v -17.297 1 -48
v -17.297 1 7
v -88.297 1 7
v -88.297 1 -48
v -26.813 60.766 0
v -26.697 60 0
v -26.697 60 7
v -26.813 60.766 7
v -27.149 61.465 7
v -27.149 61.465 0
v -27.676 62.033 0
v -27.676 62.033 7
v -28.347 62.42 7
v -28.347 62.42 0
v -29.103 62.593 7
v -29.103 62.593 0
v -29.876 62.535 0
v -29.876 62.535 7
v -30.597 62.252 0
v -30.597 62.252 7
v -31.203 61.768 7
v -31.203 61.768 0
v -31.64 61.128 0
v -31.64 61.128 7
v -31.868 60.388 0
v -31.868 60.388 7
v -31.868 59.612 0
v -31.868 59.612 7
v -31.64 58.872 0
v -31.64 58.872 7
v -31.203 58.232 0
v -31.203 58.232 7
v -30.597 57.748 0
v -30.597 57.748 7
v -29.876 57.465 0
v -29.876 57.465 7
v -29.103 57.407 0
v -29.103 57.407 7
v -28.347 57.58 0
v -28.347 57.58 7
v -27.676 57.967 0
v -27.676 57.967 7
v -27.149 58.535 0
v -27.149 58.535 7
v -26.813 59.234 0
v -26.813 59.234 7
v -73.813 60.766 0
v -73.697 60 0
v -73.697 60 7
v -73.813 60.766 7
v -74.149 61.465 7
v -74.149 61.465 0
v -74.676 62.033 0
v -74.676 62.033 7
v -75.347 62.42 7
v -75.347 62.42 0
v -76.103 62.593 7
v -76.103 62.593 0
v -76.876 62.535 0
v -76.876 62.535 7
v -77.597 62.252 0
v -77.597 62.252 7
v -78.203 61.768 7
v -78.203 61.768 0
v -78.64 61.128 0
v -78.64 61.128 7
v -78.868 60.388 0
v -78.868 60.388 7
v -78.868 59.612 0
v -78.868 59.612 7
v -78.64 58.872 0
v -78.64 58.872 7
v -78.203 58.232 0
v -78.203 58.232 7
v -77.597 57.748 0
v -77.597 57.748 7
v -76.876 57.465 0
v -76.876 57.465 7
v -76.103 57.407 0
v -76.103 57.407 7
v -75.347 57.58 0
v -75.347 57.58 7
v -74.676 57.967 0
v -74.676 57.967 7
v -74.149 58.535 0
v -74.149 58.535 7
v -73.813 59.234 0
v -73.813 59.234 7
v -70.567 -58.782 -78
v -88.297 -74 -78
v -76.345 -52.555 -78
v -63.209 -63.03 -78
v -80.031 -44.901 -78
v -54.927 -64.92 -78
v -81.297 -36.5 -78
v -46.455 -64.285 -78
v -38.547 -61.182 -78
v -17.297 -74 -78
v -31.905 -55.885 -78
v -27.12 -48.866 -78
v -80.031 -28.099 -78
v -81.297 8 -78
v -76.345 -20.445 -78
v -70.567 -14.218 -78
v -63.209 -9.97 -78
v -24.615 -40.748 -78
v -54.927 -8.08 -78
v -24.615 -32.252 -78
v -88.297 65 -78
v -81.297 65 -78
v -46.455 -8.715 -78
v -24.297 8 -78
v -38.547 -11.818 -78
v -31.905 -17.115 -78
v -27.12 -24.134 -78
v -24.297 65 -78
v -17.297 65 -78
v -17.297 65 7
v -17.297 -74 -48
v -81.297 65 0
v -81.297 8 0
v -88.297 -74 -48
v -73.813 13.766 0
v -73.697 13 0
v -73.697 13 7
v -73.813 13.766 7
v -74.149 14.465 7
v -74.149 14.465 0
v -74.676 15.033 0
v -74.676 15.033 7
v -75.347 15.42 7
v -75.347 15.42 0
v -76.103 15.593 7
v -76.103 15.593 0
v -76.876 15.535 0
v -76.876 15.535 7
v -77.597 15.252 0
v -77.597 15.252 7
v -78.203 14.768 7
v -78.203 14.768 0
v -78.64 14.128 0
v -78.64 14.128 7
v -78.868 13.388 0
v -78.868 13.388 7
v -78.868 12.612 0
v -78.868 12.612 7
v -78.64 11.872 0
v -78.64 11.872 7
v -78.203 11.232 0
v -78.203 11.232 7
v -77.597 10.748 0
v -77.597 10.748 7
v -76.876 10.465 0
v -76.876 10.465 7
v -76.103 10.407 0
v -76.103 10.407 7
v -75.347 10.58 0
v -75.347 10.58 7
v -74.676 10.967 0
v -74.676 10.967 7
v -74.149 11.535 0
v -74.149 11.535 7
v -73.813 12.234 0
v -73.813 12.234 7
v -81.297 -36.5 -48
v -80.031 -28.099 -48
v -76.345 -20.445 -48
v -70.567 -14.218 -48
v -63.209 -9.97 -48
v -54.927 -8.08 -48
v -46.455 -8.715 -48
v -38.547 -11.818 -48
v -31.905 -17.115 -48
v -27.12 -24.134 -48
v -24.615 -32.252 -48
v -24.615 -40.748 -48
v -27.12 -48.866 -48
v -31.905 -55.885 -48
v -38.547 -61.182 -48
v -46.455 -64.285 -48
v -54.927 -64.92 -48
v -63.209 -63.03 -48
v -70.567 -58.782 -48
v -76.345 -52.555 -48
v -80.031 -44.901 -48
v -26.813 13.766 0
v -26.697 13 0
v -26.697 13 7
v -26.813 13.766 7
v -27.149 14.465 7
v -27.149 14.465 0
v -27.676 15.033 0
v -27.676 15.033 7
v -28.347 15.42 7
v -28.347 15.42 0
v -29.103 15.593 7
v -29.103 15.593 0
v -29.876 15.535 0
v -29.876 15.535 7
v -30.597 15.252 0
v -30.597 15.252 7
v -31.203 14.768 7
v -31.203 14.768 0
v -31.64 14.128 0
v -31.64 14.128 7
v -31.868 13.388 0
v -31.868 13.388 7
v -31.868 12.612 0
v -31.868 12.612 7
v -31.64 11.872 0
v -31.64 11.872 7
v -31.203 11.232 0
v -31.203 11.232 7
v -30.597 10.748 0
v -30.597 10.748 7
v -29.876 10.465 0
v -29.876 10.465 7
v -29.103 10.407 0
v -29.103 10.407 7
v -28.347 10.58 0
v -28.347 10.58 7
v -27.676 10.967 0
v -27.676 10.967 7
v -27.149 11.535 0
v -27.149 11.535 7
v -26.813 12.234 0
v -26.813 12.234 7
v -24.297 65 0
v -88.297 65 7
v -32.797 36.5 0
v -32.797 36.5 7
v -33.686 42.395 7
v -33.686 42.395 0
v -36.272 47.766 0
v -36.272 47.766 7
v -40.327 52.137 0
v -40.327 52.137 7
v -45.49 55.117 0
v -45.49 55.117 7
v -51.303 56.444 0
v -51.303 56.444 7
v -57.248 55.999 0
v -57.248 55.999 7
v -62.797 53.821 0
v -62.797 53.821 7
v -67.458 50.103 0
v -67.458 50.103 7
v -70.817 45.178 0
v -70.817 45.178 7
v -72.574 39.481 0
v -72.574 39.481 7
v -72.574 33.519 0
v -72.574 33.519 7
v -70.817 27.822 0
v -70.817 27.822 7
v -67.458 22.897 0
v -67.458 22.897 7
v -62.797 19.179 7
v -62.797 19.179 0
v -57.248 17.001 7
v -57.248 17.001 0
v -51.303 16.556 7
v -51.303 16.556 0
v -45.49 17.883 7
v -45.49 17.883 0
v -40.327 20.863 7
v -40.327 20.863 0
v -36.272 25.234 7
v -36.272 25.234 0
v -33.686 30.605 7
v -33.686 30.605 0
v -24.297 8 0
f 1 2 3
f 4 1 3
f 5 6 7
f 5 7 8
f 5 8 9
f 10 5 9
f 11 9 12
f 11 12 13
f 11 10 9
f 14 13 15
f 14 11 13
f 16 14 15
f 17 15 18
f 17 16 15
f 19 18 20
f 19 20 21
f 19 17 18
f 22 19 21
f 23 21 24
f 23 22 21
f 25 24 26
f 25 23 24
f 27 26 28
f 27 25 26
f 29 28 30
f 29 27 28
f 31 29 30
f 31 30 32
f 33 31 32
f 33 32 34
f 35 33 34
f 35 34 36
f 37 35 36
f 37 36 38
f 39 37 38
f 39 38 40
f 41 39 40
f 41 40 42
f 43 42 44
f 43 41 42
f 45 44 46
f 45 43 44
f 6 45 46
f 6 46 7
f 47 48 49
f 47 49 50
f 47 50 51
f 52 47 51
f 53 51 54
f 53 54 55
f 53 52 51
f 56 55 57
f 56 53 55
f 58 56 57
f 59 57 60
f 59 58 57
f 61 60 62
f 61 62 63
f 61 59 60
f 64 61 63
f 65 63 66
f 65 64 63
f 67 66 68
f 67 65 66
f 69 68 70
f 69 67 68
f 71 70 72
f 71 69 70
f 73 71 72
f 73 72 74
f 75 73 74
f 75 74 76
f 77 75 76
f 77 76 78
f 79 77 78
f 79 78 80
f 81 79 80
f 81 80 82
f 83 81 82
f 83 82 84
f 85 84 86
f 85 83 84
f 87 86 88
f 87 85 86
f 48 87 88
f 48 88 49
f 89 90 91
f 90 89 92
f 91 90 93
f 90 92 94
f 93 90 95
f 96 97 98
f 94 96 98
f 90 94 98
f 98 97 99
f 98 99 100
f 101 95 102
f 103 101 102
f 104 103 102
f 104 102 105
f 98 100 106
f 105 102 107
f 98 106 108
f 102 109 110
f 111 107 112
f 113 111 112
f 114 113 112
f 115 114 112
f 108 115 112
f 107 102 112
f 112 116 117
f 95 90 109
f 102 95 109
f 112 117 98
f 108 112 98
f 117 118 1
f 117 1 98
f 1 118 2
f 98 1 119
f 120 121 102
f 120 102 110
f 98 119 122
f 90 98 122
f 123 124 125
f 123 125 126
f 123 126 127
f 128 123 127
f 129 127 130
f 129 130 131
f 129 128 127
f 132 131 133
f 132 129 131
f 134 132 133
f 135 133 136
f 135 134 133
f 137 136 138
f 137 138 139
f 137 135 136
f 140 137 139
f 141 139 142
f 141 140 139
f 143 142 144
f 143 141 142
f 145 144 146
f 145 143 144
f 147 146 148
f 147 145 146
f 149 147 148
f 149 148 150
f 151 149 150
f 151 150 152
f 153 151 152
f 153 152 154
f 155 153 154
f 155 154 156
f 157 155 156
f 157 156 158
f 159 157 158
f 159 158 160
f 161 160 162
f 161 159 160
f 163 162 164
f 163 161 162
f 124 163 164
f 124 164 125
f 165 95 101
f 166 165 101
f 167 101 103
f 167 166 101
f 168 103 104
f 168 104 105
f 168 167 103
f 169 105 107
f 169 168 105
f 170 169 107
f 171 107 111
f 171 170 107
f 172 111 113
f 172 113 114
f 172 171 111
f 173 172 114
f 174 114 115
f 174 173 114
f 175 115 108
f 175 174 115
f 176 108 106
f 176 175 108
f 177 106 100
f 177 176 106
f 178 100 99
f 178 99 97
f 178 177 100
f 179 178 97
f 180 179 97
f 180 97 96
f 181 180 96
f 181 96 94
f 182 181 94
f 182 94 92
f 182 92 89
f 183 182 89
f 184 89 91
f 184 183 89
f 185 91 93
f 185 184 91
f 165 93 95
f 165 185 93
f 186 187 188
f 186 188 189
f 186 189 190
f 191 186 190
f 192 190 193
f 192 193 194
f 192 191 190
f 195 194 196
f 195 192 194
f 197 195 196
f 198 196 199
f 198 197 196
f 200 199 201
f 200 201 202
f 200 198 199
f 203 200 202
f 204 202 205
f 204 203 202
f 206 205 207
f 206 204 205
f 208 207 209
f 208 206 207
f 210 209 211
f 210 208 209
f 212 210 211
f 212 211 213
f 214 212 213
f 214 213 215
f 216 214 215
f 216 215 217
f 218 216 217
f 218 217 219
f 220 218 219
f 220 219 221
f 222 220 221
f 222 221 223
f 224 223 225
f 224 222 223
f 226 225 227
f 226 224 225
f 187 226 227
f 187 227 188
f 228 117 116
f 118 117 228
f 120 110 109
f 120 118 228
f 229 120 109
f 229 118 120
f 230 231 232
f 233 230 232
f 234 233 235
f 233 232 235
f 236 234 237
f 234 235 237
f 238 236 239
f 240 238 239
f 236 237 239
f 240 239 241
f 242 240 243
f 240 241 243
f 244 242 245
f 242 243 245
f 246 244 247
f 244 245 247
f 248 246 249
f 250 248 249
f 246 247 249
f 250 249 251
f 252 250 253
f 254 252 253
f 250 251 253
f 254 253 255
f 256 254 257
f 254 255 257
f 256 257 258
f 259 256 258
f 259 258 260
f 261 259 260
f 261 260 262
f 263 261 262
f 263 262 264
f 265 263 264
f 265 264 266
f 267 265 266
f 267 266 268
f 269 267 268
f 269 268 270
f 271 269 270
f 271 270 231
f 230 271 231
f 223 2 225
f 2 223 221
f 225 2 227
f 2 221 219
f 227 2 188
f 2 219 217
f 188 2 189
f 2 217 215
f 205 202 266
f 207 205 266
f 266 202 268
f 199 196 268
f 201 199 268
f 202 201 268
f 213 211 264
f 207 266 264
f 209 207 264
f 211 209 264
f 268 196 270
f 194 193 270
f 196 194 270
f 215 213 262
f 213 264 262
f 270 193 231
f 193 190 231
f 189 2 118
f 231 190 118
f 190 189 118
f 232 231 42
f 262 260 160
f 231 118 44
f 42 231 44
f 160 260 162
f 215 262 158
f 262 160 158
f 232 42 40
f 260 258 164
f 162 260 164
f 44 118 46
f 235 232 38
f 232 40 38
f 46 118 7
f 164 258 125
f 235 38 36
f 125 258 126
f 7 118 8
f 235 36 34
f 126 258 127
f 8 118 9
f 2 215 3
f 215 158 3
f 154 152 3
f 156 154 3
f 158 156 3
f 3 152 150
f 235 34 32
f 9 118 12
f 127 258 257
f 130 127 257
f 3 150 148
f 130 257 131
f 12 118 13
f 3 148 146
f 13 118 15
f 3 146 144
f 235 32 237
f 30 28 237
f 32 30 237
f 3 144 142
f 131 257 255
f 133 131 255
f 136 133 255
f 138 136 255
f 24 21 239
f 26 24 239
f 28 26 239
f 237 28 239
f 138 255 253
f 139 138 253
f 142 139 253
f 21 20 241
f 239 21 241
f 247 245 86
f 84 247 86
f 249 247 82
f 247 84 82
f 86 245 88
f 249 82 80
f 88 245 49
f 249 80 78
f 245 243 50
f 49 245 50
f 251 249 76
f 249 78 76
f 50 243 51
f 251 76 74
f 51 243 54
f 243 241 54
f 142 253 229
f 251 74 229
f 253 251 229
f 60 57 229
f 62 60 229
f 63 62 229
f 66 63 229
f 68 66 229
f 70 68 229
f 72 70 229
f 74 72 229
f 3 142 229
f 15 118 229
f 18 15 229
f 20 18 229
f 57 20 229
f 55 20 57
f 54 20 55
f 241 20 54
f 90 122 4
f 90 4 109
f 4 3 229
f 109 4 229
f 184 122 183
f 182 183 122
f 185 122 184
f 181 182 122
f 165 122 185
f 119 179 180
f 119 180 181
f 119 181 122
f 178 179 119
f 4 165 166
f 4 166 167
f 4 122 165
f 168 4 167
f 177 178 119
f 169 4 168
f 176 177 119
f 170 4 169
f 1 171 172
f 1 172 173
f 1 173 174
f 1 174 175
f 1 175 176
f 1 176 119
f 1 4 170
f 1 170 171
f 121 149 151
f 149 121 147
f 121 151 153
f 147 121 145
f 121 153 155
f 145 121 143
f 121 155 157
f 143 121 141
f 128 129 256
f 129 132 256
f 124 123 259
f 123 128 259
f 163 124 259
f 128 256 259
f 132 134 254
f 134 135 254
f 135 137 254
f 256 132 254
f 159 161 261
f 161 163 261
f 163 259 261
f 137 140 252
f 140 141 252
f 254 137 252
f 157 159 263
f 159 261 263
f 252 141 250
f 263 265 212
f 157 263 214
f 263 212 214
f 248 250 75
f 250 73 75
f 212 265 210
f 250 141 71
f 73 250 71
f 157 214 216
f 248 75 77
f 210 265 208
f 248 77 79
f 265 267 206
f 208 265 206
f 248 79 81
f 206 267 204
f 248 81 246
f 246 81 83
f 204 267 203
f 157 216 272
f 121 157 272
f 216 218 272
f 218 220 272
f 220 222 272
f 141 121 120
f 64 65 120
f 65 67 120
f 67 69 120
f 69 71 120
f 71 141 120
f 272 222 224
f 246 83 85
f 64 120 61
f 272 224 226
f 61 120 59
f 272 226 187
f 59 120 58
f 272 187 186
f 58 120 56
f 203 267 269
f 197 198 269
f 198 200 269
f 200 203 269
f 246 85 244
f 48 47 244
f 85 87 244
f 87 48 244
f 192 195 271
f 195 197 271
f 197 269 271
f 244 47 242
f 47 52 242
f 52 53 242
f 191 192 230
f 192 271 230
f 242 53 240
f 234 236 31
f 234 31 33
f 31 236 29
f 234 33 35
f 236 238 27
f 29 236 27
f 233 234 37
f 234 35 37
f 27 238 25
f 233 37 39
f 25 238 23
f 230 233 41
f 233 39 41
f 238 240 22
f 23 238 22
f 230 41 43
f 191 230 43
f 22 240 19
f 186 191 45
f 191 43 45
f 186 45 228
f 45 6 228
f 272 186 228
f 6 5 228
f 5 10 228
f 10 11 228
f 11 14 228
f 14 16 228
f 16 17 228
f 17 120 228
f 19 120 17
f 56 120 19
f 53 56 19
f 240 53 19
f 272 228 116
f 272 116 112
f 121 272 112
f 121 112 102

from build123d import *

# Parameters (mm, degrees)
SKETCH1_R                = 2.6
BOSS_EXTRUDE1_DEPTH      = 7
SKETCH3_R                = 20
CUT_EXTRUDE1_DEPTH       = 105.322688225
BOSS_EXTRUDE2_DEPTH      = 75
BOSS_EXTRUDE3_DEPTH      = 10
BOSS_EXTRUDE3_DEPTH_BACK = 20
SKETCH5_R                = 28.5


with BuildPart() as part:
    # Sketch1 → Boss-Extrude1 (new body)
    with BuildSketch(Plane.XY):
        Polygon((-81.297129584, 62), (-81.297129584, 25.5), (-81.297129584, 8), (-78.297129584, 8), (-41.797129584, 8), (-24.297129584, 8), (-24.297129584, 11), (-24.297129584, 47.5), (-24.297129584, 65), (-27.297129584, 65), (-63.797129584, 65), (-81.297129584, 65), align=None)
        with Locations((-76.297129584, 13)):
            Circle(SKETCH1_R, mode=Mode.SUBTRACT)
        with Locations((-29.297129584, 13)):
            Circle(SKETCH1_R, mode=Mode.SUBTRACT)
        with Locations((-29.297129584, 60)):
            Circle(SKETCH1_R, mode=Mode.SUBTRACT)
        with Locations((-76.297129584, 60)):
            Circle(SKETCH1_R, mode=Mode.SUBTRACT)
    extrude(amount=BOSS_EXTRUDE1_DEPTH)

    # Sketch3 → Cut-Extrude1 (cut, through all)
    with BuildSketch(Plane.XY.offset(7)):
        with Locations((-52.797129584, 36.5)):
            Circle(SKETCH3_R)
    extrude(amount=-CUT_EXTRUDE1_DEPTH, mode=Mode.SUBTRACT)

    # Sketch4 → Boss-Extrude2 (add)
    with BuildSketch(Plane.XY.offset(7)):
        Polygon((-24.297129584, 65), (-17.297129584, 65), (-17.297129584, 1), (-88.297129584, 1), (-88.297129584, 65), (-81.297129584, 65), (-81.297129584, 8), (-24.297129584, 8), align=None)
    extrude(amount=-BOSS_EXTRUDE2_DEPTH)

    # Sketch5 → Boss-Extrude3 (add, two sides: drawn at the far end of the back side and taken through both)
    with BuildSketch(Plane(origin=(0, 0, -68), x_dir=(-1, 0, 0), z_dir=(0, 0, -1)).offset(-BOSS_EXTRUDE3_DEPTH_BACK)):
        Polygon((88.297129584, 1), (88.297129584, -74), (52.797129584, -74), (17.297129584, -74), (17.297129584, 1), (17.297129584, 65), (24.297129584, 65), (24.297129584, 8), (81.297129584, 8), (81.297129584, 65), (88.297129584, 65), align=None)
        with Locations((52.797129584, -36.5)):
            Circle(SKETCH5_R, mode=Mode.SUBTRACT)
    extrude(amount=BOSS_EXTRUDE3_DEPTH + BOSS_EXTRUDE3_DEPTH_BACK)


solid = part.part
